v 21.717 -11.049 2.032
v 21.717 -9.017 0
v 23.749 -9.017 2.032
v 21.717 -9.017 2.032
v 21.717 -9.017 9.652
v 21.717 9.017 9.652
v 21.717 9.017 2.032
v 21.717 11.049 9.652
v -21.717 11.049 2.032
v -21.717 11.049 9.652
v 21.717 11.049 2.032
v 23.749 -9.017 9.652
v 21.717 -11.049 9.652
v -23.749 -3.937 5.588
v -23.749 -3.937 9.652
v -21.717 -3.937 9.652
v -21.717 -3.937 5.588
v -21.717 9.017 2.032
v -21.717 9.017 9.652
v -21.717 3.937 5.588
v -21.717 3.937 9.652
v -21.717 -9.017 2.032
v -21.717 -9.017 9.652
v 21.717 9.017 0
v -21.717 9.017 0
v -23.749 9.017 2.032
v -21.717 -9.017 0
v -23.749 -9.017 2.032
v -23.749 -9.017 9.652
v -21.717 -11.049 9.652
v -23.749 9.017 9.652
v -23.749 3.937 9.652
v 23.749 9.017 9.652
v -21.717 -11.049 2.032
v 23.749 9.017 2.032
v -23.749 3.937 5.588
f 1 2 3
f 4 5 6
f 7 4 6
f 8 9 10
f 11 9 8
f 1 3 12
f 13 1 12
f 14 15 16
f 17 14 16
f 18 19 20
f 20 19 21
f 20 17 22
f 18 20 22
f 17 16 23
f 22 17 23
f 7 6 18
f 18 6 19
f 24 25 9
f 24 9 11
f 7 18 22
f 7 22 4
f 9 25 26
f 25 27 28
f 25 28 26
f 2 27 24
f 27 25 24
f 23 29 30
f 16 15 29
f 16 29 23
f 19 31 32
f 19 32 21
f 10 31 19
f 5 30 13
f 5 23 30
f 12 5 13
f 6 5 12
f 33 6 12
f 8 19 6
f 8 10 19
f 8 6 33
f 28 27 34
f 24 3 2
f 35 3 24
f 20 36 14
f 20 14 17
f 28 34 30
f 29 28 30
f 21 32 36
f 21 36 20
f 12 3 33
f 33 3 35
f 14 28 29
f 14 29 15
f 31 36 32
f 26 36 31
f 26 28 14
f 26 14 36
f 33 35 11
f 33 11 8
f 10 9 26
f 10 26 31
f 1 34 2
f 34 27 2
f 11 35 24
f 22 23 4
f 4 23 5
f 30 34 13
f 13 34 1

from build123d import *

# Parameters (mm, degrees)
F0_W     = 47.498
F0_H     = 22.098
F1_DEPTH = 9.652
F3_DEPTH = 7.62
F4_SIZE  = 2.032
F5_W     = 2.032
F5_H     = 7.874
F6_DEPTH = 4.064


with BuildPart() as f1:
    # F0 (on Top) → F1 (new body)
    with BuildSketch(Plane.XY):
        Rectangle(F0_W, F0_H)
    extrude(amount=F1_DEPTH)

    # F2 (on face) → F3 (cut)
    with BuildSketch(Plane.XY.offset(9.652)):
        Polygon((21.717, 9.017), (-21.717, 9.017), (-21.717, 4.28625), (-21.717, -4.28625), (-21.717, -9.017), (21.717, -9.017), align=None)
    extrude(amount=-F3_DEPTH, mode=Mode.SUBTRACT)

    # F4
    f4_edges = [f1.edges().sort_by_distance(p)[0] for p in [
        (0, -11.049, 0),
        (23.749, 0, 0),
        (23.749, -11.049, 4.826),
        (23.749, 11.049, 4.826),
        (-23.749, 0, 0),
        (0, 11.049, 0),
        (-23.749, -11.049, 4.826),
        (-23.749, 11.049, 4.826),
    ]]
    chamfer(f4_edges, length=F4_SIZE)

    # F5 (on face) → F6 (cut)
    with BuildSketch(Plane.XY.offset(9.652)):
        with Locations((-22.733, 0)):
            Rectangle(F5_W, F5_H)
    extrude(amount=-F6_DEPTH, mode=Mode.SUBTRACT)


solid = f1.part
